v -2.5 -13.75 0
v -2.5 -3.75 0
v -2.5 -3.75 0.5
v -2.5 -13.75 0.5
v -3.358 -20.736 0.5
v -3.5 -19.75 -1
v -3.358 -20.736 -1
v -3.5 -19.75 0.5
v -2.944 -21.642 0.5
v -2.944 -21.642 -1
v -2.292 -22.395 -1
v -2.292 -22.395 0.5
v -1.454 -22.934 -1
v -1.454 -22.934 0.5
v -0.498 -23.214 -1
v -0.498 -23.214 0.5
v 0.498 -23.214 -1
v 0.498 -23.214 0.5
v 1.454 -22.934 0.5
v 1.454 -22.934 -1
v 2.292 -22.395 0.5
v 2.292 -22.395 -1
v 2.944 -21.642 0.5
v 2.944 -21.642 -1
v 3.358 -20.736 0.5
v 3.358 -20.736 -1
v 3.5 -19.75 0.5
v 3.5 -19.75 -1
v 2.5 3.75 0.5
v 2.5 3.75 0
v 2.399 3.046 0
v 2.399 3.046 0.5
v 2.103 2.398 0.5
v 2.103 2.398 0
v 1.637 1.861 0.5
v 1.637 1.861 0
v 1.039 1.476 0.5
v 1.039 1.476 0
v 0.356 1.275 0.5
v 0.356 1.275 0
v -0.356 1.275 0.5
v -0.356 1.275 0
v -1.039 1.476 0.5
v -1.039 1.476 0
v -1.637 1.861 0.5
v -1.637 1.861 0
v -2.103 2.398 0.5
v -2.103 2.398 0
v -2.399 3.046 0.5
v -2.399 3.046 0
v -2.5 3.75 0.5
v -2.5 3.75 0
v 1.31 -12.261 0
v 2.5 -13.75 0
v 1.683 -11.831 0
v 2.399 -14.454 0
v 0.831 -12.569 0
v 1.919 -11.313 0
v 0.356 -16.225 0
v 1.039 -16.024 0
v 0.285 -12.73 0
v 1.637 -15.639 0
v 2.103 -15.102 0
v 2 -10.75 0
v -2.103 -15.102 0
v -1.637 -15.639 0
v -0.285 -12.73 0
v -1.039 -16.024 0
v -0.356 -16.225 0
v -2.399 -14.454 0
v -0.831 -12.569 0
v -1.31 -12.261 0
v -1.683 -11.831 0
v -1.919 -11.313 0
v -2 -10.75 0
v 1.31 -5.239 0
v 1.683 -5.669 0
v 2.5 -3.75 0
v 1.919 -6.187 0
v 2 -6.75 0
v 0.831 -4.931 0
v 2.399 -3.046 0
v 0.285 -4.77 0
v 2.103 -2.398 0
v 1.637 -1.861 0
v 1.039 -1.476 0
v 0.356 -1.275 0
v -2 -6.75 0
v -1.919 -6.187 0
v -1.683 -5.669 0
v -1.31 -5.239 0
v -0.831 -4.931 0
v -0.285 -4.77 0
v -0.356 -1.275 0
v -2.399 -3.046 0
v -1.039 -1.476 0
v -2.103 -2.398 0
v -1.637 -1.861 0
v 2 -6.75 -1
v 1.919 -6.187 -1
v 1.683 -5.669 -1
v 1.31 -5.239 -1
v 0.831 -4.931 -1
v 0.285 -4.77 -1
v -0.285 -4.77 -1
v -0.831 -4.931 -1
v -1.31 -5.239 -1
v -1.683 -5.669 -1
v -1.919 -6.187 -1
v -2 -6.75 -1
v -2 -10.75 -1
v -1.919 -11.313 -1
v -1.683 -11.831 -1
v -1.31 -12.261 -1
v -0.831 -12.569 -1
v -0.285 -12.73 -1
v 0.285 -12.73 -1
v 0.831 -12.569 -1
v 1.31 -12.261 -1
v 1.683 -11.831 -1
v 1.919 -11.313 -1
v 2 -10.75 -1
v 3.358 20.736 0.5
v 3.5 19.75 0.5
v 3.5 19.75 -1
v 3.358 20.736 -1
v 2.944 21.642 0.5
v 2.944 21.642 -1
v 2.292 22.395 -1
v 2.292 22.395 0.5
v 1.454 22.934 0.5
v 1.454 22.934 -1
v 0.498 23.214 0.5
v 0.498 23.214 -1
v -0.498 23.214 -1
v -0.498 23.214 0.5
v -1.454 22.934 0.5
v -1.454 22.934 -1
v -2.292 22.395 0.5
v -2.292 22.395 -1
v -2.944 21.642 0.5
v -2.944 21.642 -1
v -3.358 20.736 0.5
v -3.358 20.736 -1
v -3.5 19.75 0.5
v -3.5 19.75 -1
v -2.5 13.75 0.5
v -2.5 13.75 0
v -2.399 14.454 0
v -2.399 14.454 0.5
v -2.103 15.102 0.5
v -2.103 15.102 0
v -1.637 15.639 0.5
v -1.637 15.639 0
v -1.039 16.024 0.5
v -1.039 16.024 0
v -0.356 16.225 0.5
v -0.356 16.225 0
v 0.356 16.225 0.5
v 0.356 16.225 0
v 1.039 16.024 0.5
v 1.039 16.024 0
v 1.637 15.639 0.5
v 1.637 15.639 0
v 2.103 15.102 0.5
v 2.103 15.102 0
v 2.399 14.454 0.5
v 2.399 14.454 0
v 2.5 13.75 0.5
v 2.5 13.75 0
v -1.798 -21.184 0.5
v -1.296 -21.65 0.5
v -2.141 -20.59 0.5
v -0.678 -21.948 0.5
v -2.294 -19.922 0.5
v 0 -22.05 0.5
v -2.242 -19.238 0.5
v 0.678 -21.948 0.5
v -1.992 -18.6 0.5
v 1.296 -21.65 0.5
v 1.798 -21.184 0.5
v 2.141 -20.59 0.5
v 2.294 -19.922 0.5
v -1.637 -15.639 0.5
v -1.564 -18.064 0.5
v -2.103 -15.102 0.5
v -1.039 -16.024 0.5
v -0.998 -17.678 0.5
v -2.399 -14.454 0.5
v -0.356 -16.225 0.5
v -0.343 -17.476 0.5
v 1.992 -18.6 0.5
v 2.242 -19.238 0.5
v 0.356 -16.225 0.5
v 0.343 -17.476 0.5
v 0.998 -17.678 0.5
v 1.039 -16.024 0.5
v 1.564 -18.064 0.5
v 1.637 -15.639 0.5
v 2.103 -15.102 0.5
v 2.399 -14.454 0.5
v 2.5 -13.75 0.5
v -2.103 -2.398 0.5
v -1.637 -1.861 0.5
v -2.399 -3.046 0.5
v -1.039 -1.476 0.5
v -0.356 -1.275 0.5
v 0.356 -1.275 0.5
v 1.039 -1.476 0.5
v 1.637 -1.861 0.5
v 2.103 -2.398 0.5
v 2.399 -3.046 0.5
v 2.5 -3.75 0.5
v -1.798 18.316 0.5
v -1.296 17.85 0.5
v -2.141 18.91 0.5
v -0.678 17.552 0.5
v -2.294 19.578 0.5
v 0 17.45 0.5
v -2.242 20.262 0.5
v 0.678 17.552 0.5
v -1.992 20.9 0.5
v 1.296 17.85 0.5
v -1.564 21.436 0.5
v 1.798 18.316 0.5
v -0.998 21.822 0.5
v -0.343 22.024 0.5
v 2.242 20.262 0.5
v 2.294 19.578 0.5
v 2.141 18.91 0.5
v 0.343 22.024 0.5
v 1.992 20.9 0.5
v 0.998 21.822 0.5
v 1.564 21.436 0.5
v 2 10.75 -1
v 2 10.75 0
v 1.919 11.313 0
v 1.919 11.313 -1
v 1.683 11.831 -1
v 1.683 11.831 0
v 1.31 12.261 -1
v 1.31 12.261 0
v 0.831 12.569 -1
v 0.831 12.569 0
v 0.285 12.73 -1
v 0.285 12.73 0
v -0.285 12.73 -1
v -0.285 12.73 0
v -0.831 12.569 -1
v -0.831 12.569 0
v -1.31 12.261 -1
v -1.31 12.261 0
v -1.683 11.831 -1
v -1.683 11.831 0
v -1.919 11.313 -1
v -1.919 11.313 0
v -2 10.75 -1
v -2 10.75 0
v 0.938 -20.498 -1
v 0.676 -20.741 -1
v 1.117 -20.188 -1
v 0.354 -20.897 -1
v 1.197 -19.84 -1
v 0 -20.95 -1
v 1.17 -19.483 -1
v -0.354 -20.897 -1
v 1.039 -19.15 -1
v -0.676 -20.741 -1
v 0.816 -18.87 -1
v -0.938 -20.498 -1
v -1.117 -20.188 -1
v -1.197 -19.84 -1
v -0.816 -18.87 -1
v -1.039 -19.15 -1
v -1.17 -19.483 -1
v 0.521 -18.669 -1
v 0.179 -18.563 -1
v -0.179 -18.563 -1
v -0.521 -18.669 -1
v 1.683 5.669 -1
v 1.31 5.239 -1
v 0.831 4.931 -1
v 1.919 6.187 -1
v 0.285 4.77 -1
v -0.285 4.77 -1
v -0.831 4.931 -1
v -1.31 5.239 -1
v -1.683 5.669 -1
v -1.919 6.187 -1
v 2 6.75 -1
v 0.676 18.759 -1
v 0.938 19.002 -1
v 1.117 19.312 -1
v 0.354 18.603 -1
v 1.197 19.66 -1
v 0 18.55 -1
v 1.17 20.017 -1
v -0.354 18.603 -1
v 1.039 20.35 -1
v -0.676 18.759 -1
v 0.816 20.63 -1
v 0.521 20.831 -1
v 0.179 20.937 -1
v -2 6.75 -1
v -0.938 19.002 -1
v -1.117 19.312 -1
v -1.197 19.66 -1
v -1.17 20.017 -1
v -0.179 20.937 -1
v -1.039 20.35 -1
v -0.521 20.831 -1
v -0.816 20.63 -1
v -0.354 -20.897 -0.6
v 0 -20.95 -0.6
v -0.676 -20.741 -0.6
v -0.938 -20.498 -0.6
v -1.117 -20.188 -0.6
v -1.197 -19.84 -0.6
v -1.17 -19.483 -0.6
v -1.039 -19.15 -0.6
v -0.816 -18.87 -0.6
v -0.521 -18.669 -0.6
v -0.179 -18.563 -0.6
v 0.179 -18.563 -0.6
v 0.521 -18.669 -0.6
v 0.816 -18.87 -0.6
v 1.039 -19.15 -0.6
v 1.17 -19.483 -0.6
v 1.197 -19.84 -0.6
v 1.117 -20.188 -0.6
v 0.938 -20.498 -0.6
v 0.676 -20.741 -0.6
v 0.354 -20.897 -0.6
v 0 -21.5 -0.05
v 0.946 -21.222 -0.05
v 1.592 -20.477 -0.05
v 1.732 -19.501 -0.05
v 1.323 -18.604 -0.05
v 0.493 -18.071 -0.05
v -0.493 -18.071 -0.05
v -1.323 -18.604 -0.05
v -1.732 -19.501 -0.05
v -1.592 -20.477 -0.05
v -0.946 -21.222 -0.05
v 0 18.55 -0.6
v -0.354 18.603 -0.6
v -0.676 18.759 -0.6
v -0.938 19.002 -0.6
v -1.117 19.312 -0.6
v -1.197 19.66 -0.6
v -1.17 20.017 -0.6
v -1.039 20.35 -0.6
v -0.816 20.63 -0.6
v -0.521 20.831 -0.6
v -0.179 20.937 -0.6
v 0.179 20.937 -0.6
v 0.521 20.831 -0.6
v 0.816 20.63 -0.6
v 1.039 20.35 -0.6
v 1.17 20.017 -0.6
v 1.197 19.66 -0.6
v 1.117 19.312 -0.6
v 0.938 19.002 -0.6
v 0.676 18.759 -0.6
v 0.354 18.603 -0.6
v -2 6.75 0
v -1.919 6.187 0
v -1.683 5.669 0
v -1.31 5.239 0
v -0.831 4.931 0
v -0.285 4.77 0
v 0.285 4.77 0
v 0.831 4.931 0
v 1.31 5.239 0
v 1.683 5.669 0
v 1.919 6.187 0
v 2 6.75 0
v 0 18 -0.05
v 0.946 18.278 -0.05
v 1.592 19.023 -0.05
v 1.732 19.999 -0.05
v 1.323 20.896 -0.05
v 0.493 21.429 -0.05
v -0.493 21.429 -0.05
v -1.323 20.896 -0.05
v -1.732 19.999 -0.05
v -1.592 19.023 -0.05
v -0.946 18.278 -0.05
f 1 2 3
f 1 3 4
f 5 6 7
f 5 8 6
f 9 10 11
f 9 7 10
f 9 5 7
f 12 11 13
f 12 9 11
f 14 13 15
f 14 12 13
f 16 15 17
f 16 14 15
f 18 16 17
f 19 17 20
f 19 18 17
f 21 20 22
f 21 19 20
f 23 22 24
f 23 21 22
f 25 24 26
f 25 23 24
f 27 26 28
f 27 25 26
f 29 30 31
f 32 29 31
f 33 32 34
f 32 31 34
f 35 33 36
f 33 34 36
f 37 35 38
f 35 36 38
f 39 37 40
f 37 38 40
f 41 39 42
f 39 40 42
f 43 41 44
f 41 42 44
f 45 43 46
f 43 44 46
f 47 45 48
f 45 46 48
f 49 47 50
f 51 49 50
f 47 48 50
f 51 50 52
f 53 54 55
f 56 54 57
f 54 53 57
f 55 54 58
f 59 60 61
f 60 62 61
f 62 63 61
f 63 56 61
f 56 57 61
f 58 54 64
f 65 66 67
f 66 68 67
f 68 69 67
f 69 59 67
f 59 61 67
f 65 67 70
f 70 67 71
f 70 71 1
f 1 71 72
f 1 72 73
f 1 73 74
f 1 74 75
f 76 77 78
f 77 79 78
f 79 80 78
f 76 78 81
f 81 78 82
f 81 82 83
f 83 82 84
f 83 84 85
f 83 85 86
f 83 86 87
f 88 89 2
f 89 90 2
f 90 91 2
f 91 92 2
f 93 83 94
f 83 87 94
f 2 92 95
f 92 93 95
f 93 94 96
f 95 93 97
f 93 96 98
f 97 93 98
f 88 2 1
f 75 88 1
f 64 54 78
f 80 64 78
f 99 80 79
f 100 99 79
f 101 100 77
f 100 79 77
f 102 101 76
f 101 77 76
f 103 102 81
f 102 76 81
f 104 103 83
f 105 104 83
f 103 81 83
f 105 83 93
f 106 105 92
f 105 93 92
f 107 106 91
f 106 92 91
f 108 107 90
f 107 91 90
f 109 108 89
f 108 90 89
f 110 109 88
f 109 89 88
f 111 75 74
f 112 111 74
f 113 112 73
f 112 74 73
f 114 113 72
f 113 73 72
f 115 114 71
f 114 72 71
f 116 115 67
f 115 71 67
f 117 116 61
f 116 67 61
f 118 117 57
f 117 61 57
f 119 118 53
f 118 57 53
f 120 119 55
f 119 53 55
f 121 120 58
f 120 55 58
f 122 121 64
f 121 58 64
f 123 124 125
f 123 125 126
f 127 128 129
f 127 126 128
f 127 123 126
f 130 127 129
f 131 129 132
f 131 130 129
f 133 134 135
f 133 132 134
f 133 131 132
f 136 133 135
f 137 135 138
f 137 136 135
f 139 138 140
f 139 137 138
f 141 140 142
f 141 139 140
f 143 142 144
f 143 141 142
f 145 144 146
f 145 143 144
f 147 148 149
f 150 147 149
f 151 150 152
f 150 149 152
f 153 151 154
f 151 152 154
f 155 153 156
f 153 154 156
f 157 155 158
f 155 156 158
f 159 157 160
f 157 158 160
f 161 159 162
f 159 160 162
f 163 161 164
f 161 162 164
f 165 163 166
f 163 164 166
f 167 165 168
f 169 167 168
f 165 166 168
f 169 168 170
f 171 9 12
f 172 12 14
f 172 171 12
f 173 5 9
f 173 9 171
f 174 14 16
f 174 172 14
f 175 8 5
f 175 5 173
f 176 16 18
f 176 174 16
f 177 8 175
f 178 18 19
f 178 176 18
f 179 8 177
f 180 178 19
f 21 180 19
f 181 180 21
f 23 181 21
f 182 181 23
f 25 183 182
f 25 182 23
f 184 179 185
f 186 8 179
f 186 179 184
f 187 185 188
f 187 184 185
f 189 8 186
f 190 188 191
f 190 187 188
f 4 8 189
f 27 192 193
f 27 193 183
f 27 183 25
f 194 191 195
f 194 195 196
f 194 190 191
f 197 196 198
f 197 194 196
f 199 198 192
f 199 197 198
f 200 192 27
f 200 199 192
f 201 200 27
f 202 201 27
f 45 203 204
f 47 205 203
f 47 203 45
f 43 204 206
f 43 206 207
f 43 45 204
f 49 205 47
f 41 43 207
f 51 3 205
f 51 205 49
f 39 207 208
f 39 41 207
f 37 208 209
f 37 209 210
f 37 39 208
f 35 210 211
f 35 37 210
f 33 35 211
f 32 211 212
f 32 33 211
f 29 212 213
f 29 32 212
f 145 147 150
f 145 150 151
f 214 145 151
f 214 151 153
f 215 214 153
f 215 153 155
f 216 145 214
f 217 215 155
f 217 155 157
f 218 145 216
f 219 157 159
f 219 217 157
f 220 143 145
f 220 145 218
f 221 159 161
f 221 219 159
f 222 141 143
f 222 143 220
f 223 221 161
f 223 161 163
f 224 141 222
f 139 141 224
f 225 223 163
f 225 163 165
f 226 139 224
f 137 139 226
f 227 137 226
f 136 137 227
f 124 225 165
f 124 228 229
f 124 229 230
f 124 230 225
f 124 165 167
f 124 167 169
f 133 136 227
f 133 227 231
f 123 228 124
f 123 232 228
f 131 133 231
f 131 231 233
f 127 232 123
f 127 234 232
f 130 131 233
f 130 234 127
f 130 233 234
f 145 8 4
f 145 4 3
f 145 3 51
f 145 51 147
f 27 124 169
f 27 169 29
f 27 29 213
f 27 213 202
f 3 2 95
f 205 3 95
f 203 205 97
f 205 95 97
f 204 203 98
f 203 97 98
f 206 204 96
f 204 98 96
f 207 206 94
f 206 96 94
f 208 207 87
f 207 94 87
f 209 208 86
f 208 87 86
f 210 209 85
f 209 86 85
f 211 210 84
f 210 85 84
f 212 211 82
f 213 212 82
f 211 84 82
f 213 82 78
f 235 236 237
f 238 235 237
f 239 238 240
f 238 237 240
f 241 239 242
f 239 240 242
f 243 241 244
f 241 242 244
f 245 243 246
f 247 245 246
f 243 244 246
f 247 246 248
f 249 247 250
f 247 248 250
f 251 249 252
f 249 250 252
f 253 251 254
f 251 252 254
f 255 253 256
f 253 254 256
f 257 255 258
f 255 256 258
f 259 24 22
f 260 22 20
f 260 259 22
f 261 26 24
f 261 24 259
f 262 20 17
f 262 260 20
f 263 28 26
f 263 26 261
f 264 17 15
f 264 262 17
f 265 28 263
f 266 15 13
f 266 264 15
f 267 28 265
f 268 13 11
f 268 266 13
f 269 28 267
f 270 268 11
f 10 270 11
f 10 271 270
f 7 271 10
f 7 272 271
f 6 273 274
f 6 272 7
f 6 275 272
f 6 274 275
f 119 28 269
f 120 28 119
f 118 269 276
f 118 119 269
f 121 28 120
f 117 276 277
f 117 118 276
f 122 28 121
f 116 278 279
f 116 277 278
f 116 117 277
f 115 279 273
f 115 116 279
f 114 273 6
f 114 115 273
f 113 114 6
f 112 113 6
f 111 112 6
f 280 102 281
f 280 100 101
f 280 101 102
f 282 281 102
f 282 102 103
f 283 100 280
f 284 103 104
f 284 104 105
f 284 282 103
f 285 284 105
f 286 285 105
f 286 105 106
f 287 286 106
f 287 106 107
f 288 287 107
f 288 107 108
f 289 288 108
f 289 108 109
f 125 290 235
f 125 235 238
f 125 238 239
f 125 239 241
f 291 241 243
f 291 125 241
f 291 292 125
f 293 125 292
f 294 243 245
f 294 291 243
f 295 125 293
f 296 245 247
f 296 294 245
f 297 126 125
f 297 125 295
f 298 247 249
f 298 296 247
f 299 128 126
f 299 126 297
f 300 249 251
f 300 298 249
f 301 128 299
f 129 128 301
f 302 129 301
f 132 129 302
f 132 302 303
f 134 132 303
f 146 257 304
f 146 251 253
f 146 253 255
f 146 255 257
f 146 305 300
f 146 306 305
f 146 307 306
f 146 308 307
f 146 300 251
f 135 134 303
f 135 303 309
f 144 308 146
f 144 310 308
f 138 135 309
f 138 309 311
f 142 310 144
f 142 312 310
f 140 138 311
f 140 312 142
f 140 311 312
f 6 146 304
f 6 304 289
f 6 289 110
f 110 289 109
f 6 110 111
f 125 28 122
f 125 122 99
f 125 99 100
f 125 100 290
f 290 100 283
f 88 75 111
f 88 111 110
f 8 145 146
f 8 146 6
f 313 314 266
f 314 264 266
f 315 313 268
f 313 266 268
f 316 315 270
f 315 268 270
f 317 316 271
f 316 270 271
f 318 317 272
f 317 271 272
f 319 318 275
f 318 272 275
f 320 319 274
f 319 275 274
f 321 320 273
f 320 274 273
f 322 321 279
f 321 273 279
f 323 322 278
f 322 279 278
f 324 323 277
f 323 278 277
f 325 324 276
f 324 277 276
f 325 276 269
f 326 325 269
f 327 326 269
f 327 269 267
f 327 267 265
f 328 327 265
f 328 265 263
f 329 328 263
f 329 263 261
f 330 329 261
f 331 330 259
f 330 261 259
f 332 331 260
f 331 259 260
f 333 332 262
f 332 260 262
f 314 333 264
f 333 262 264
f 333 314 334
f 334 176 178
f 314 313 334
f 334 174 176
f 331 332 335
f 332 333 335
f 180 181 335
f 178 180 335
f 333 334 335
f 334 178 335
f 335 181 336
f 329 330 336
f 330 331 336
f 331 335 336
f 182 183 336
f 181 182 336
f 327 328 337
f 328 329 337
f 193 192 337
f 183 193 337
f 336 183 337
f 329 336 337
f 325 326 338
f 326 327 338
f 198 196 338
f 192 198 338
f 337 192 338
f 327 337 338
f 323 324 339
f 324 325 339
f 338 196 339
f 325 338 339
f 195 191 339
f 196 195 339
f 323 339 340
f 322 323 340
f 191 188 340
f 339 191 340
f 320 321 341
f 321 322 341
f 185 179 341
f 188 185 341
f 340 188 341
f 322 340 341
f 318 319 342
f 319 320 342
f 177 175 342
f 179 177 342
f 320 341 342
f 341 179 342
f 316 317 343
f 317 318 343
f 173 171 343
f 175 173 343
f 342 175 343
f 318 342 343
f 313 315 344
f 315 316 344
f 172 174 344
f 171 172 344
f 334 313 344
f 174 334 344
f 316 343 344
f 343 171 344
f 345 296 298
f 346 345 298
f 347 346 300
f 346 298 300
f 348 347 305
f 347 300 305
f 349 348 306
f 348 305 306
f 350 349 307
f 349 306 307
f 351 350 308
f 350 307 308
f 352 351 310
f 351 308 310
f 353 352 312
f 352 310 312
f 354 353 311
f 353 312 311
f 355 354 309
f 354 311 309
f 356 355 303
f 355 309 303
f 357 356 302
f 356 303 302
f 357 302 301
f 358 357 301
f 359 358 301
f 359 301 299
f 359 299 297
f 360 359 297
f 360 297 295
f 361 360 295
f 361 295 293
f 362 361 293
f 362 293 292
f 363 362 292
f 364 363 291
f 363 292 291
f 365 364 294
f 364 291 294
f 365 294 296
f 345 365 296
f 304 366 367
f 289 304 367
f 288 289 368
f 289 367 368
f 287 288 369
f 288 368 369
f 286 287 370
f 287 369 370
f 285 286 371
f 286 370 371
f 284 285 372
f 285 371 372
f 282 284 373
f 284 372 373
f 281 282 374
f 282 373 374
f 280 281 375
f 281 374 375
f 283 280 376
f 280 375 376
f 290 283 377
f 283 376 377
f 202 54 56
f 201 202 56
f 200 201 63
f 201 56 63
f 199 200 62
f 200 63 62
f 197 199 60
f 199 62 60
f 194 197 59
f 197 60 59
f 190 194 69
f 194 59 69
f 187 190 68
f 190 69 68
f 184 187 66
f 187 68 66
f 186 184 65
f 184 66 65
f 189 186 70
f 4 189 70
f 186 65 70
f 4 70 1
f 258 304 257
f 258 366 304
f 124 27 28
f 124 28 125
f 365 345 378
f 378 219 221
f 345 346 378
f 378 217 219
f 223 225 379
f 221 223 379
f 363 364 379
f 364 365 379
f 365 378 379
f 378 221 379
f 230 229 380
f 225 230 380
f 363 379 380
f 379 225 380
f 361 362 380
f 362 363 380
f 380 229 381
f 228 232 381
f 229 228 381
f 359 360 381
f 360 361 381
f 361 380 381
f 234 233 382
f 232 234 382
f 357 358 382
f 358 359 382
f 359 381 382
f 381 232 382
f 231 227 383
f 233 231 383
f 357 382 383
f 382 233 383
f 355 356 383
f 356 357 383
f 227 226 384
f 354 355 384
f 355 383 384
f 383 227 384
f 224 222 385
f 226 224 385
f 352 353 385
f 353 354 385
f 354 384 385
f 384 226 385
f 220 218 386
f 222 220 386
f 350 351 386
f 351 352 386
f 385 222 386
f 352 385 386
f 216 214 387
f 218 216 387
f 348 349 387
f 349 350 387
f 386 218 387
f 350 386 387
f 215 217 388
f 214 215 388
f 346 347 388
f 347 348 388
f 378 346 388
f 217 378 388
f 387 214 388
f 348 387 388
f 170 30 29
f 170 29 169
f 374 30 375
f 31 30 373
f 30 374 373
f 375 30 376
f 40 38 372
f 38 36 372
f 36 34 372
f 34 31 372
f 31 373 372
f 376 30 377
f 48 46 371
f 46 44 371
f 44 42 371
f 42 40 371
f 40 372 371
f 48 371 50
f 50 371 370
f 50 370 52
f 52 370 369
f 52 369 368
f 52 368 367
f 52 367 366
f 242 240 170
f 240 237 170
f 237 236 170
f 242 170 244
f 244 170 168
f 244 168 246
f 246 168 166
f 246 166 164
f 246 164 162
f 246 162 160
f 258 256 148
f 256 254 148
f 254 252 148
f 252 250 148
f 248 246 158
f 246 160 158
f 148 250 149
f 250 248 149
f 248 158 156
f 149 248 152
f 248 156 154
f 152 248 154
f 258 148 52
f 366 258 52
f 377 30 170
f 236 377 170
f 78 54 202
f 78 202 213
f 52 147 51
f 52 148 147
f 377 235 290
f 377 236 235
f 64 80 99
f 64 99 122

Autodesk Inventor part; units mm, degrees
ref_plane "YZ Plane" through (0, 0, 0) normal (1, 0, 0) x (0, 1, 0)
ref_plane "XZ Plane" through (0, 0, 0) normal (0, 1, 0) x (-1, 0, 0)
ref_plane "XY Plane" through (0, 0, 0) normal (0, 0, 1) x (1, 0, 0)
sketch "Skizze1" plane through (0, 0, 0) normal (0, 0, 1) x (1, 0, 0)
  line L0 (-4.9, 0) -> (4.9, 0) projected
  line L1 (0, -32.55) -> (0, 32.55) projected
  line L2 (0, 5) -> (0, -5) construction
  line L3 (0, 19.75) -> (0, -19.75) construction
  line L4 (-3.5, 19.75) -> (-3.5, -19.75)
  line L5 (3.5, -19.75) -> (3.5, 19.75)
  arc A0 (3.5, 19.75) -> (-3.5, 19.75) centre (0, 19.75) ccw
  arc A1 (-3.5, -19.75) -> (3.5, -19.75) centre (0, -19.75) ccw
  line L6 (0, 3.75) -> (0, 13.75) construction
  line L7 (2.5, 3.75) -> (2.5, 13.75)
  line L8 (-2.5, 13.75) -> (-2.5, 3.75)
  arc A2 (-2.5, 3.75) -> (2.5, 3.75) centre (0, 3.75) ccw
  arc A3 (2.5, 13.75) -> (-2.5, 13.75) centre (0, 13.75) ccw
  line L9 (0, -13.75) -> (0, -3.75) construction
  line L10 (2.5, -13.75) -> (2.5, -3.75)
  line L11 (-2.5, -3.75) -> (-2.5, -13.75)
  arc A4 (-2.5, -13.75) -> (2.5, -13.75) centre (0, -13.75) ccw
  arc A5 (2.5, -3.75) -> (-2.5, -3.75) centre (0, -3.75) ccw
  point P0 (0, 0)
  point P1 (0, 0)
  point P2 (0, 0)
  point P3 (0, 8.75)
  point P4 (0, -8.75)
  dimension "d2" = 7
  dimension "d3" = 1.25
  dimension "d4" = 1.25
  dimension "d5" = 23.25
  dimension "d17" = 10
  dimension "d18" = 10
  dimension "d19" = 5
extrude "Extrusion3" add sketch "Skizze1" along normal blind 0.5 contours L4 A0 L1 A3 L8 A2 L0 | L0 L1 A5 L11 A4 A1 L4 | L1 A2 L7 A3 A0 L5 L0 | L0 L5 A1 L1 A4 L10 A5
sketch "Skizze4" plane through (0, 0, 0) normal (0, 0, -1) x (-1, 0, 0)
  line L0 (3.5, 19.75) -> (3.5, -19.75) projected
  arc A0 (3.5, 19.75) -> (-3.5, 19.75) centre (0, 19.75) ccw projected
  line L1 (-3.5, -19.75) -> (-3.5, 19.75) projected
  arc A1 (-3.5, -19.75) -> (3.5, -19.75) centre (0, -19.75) ccw projected
  point P0 (0, 0)
extrude "Extrusion4" add sketch "Skizze4" along normal blind 1
sketch "Skizze5" plane through (0, 0, 0.5) normal (0, 0, 1) x (1, 0, 0)
  arc A0 (-3.5, -19.75) -> (3.5, -19.75) centre (0, -19.75) ccw projected
  arc A1 (3.5, 19.75) -> (-3.5, 19.75) centre (0, 19.75) ccw projected
  point P0 (0, 0)
hole "Bohrung2" at (0, 19.75, 0.5) at (0, -19.75, 0.5) direction (0, 0, -1) diameter 2.4 end through all countersink diameter 4.6 countersink angle 90
sketch "Skizze6" plane through (0, 0, 0) normal (0, 0, 1) x (1, 0, 0)
  arc A0 (-2.5, -13.75) -> (2.5, -13.75) centre (0, -13.75) ccw projected
  arc A1 (2.5, -3.75) -> (-2.5, -3.75) centre (0, -3.75) ccw projected
  line L0 (-2.5, -3.75) -> (-2.5, -13.75) projected
  line L1 (0, -3.75) -> (0, -13.75)
  line L2 (0, -13.75) -> (0, -8.75)
  line L3 (0, -8.75) -> (-1.5, -8.75)
  line L4 (0, -6.75) -> (0, -10.75) construction
  line L5 (2, -6.75) -> (2, -10.75)
  line L6 (-2, -10.75) -> (-2, -6.75)
  arc A2 (2, -6.75) -> (-2, -6.75) centre (0, -6.75) ccw
  arc A3 (-2, -10.75) -> (2, -10.75) centre (0, -10.75) ccw
  point P0 (0, 0)
  dimension "d32" = 8
  dimension "d33" = 4
extrude "Extrusion5" cut sketch "Skizze6" against normal through all
pattern_linear "Rechteckige Anordnung1" count 2 spacing 17.5 along (0, 1, 0) of "Extrusion5"
properties part number "13_1087_019"
